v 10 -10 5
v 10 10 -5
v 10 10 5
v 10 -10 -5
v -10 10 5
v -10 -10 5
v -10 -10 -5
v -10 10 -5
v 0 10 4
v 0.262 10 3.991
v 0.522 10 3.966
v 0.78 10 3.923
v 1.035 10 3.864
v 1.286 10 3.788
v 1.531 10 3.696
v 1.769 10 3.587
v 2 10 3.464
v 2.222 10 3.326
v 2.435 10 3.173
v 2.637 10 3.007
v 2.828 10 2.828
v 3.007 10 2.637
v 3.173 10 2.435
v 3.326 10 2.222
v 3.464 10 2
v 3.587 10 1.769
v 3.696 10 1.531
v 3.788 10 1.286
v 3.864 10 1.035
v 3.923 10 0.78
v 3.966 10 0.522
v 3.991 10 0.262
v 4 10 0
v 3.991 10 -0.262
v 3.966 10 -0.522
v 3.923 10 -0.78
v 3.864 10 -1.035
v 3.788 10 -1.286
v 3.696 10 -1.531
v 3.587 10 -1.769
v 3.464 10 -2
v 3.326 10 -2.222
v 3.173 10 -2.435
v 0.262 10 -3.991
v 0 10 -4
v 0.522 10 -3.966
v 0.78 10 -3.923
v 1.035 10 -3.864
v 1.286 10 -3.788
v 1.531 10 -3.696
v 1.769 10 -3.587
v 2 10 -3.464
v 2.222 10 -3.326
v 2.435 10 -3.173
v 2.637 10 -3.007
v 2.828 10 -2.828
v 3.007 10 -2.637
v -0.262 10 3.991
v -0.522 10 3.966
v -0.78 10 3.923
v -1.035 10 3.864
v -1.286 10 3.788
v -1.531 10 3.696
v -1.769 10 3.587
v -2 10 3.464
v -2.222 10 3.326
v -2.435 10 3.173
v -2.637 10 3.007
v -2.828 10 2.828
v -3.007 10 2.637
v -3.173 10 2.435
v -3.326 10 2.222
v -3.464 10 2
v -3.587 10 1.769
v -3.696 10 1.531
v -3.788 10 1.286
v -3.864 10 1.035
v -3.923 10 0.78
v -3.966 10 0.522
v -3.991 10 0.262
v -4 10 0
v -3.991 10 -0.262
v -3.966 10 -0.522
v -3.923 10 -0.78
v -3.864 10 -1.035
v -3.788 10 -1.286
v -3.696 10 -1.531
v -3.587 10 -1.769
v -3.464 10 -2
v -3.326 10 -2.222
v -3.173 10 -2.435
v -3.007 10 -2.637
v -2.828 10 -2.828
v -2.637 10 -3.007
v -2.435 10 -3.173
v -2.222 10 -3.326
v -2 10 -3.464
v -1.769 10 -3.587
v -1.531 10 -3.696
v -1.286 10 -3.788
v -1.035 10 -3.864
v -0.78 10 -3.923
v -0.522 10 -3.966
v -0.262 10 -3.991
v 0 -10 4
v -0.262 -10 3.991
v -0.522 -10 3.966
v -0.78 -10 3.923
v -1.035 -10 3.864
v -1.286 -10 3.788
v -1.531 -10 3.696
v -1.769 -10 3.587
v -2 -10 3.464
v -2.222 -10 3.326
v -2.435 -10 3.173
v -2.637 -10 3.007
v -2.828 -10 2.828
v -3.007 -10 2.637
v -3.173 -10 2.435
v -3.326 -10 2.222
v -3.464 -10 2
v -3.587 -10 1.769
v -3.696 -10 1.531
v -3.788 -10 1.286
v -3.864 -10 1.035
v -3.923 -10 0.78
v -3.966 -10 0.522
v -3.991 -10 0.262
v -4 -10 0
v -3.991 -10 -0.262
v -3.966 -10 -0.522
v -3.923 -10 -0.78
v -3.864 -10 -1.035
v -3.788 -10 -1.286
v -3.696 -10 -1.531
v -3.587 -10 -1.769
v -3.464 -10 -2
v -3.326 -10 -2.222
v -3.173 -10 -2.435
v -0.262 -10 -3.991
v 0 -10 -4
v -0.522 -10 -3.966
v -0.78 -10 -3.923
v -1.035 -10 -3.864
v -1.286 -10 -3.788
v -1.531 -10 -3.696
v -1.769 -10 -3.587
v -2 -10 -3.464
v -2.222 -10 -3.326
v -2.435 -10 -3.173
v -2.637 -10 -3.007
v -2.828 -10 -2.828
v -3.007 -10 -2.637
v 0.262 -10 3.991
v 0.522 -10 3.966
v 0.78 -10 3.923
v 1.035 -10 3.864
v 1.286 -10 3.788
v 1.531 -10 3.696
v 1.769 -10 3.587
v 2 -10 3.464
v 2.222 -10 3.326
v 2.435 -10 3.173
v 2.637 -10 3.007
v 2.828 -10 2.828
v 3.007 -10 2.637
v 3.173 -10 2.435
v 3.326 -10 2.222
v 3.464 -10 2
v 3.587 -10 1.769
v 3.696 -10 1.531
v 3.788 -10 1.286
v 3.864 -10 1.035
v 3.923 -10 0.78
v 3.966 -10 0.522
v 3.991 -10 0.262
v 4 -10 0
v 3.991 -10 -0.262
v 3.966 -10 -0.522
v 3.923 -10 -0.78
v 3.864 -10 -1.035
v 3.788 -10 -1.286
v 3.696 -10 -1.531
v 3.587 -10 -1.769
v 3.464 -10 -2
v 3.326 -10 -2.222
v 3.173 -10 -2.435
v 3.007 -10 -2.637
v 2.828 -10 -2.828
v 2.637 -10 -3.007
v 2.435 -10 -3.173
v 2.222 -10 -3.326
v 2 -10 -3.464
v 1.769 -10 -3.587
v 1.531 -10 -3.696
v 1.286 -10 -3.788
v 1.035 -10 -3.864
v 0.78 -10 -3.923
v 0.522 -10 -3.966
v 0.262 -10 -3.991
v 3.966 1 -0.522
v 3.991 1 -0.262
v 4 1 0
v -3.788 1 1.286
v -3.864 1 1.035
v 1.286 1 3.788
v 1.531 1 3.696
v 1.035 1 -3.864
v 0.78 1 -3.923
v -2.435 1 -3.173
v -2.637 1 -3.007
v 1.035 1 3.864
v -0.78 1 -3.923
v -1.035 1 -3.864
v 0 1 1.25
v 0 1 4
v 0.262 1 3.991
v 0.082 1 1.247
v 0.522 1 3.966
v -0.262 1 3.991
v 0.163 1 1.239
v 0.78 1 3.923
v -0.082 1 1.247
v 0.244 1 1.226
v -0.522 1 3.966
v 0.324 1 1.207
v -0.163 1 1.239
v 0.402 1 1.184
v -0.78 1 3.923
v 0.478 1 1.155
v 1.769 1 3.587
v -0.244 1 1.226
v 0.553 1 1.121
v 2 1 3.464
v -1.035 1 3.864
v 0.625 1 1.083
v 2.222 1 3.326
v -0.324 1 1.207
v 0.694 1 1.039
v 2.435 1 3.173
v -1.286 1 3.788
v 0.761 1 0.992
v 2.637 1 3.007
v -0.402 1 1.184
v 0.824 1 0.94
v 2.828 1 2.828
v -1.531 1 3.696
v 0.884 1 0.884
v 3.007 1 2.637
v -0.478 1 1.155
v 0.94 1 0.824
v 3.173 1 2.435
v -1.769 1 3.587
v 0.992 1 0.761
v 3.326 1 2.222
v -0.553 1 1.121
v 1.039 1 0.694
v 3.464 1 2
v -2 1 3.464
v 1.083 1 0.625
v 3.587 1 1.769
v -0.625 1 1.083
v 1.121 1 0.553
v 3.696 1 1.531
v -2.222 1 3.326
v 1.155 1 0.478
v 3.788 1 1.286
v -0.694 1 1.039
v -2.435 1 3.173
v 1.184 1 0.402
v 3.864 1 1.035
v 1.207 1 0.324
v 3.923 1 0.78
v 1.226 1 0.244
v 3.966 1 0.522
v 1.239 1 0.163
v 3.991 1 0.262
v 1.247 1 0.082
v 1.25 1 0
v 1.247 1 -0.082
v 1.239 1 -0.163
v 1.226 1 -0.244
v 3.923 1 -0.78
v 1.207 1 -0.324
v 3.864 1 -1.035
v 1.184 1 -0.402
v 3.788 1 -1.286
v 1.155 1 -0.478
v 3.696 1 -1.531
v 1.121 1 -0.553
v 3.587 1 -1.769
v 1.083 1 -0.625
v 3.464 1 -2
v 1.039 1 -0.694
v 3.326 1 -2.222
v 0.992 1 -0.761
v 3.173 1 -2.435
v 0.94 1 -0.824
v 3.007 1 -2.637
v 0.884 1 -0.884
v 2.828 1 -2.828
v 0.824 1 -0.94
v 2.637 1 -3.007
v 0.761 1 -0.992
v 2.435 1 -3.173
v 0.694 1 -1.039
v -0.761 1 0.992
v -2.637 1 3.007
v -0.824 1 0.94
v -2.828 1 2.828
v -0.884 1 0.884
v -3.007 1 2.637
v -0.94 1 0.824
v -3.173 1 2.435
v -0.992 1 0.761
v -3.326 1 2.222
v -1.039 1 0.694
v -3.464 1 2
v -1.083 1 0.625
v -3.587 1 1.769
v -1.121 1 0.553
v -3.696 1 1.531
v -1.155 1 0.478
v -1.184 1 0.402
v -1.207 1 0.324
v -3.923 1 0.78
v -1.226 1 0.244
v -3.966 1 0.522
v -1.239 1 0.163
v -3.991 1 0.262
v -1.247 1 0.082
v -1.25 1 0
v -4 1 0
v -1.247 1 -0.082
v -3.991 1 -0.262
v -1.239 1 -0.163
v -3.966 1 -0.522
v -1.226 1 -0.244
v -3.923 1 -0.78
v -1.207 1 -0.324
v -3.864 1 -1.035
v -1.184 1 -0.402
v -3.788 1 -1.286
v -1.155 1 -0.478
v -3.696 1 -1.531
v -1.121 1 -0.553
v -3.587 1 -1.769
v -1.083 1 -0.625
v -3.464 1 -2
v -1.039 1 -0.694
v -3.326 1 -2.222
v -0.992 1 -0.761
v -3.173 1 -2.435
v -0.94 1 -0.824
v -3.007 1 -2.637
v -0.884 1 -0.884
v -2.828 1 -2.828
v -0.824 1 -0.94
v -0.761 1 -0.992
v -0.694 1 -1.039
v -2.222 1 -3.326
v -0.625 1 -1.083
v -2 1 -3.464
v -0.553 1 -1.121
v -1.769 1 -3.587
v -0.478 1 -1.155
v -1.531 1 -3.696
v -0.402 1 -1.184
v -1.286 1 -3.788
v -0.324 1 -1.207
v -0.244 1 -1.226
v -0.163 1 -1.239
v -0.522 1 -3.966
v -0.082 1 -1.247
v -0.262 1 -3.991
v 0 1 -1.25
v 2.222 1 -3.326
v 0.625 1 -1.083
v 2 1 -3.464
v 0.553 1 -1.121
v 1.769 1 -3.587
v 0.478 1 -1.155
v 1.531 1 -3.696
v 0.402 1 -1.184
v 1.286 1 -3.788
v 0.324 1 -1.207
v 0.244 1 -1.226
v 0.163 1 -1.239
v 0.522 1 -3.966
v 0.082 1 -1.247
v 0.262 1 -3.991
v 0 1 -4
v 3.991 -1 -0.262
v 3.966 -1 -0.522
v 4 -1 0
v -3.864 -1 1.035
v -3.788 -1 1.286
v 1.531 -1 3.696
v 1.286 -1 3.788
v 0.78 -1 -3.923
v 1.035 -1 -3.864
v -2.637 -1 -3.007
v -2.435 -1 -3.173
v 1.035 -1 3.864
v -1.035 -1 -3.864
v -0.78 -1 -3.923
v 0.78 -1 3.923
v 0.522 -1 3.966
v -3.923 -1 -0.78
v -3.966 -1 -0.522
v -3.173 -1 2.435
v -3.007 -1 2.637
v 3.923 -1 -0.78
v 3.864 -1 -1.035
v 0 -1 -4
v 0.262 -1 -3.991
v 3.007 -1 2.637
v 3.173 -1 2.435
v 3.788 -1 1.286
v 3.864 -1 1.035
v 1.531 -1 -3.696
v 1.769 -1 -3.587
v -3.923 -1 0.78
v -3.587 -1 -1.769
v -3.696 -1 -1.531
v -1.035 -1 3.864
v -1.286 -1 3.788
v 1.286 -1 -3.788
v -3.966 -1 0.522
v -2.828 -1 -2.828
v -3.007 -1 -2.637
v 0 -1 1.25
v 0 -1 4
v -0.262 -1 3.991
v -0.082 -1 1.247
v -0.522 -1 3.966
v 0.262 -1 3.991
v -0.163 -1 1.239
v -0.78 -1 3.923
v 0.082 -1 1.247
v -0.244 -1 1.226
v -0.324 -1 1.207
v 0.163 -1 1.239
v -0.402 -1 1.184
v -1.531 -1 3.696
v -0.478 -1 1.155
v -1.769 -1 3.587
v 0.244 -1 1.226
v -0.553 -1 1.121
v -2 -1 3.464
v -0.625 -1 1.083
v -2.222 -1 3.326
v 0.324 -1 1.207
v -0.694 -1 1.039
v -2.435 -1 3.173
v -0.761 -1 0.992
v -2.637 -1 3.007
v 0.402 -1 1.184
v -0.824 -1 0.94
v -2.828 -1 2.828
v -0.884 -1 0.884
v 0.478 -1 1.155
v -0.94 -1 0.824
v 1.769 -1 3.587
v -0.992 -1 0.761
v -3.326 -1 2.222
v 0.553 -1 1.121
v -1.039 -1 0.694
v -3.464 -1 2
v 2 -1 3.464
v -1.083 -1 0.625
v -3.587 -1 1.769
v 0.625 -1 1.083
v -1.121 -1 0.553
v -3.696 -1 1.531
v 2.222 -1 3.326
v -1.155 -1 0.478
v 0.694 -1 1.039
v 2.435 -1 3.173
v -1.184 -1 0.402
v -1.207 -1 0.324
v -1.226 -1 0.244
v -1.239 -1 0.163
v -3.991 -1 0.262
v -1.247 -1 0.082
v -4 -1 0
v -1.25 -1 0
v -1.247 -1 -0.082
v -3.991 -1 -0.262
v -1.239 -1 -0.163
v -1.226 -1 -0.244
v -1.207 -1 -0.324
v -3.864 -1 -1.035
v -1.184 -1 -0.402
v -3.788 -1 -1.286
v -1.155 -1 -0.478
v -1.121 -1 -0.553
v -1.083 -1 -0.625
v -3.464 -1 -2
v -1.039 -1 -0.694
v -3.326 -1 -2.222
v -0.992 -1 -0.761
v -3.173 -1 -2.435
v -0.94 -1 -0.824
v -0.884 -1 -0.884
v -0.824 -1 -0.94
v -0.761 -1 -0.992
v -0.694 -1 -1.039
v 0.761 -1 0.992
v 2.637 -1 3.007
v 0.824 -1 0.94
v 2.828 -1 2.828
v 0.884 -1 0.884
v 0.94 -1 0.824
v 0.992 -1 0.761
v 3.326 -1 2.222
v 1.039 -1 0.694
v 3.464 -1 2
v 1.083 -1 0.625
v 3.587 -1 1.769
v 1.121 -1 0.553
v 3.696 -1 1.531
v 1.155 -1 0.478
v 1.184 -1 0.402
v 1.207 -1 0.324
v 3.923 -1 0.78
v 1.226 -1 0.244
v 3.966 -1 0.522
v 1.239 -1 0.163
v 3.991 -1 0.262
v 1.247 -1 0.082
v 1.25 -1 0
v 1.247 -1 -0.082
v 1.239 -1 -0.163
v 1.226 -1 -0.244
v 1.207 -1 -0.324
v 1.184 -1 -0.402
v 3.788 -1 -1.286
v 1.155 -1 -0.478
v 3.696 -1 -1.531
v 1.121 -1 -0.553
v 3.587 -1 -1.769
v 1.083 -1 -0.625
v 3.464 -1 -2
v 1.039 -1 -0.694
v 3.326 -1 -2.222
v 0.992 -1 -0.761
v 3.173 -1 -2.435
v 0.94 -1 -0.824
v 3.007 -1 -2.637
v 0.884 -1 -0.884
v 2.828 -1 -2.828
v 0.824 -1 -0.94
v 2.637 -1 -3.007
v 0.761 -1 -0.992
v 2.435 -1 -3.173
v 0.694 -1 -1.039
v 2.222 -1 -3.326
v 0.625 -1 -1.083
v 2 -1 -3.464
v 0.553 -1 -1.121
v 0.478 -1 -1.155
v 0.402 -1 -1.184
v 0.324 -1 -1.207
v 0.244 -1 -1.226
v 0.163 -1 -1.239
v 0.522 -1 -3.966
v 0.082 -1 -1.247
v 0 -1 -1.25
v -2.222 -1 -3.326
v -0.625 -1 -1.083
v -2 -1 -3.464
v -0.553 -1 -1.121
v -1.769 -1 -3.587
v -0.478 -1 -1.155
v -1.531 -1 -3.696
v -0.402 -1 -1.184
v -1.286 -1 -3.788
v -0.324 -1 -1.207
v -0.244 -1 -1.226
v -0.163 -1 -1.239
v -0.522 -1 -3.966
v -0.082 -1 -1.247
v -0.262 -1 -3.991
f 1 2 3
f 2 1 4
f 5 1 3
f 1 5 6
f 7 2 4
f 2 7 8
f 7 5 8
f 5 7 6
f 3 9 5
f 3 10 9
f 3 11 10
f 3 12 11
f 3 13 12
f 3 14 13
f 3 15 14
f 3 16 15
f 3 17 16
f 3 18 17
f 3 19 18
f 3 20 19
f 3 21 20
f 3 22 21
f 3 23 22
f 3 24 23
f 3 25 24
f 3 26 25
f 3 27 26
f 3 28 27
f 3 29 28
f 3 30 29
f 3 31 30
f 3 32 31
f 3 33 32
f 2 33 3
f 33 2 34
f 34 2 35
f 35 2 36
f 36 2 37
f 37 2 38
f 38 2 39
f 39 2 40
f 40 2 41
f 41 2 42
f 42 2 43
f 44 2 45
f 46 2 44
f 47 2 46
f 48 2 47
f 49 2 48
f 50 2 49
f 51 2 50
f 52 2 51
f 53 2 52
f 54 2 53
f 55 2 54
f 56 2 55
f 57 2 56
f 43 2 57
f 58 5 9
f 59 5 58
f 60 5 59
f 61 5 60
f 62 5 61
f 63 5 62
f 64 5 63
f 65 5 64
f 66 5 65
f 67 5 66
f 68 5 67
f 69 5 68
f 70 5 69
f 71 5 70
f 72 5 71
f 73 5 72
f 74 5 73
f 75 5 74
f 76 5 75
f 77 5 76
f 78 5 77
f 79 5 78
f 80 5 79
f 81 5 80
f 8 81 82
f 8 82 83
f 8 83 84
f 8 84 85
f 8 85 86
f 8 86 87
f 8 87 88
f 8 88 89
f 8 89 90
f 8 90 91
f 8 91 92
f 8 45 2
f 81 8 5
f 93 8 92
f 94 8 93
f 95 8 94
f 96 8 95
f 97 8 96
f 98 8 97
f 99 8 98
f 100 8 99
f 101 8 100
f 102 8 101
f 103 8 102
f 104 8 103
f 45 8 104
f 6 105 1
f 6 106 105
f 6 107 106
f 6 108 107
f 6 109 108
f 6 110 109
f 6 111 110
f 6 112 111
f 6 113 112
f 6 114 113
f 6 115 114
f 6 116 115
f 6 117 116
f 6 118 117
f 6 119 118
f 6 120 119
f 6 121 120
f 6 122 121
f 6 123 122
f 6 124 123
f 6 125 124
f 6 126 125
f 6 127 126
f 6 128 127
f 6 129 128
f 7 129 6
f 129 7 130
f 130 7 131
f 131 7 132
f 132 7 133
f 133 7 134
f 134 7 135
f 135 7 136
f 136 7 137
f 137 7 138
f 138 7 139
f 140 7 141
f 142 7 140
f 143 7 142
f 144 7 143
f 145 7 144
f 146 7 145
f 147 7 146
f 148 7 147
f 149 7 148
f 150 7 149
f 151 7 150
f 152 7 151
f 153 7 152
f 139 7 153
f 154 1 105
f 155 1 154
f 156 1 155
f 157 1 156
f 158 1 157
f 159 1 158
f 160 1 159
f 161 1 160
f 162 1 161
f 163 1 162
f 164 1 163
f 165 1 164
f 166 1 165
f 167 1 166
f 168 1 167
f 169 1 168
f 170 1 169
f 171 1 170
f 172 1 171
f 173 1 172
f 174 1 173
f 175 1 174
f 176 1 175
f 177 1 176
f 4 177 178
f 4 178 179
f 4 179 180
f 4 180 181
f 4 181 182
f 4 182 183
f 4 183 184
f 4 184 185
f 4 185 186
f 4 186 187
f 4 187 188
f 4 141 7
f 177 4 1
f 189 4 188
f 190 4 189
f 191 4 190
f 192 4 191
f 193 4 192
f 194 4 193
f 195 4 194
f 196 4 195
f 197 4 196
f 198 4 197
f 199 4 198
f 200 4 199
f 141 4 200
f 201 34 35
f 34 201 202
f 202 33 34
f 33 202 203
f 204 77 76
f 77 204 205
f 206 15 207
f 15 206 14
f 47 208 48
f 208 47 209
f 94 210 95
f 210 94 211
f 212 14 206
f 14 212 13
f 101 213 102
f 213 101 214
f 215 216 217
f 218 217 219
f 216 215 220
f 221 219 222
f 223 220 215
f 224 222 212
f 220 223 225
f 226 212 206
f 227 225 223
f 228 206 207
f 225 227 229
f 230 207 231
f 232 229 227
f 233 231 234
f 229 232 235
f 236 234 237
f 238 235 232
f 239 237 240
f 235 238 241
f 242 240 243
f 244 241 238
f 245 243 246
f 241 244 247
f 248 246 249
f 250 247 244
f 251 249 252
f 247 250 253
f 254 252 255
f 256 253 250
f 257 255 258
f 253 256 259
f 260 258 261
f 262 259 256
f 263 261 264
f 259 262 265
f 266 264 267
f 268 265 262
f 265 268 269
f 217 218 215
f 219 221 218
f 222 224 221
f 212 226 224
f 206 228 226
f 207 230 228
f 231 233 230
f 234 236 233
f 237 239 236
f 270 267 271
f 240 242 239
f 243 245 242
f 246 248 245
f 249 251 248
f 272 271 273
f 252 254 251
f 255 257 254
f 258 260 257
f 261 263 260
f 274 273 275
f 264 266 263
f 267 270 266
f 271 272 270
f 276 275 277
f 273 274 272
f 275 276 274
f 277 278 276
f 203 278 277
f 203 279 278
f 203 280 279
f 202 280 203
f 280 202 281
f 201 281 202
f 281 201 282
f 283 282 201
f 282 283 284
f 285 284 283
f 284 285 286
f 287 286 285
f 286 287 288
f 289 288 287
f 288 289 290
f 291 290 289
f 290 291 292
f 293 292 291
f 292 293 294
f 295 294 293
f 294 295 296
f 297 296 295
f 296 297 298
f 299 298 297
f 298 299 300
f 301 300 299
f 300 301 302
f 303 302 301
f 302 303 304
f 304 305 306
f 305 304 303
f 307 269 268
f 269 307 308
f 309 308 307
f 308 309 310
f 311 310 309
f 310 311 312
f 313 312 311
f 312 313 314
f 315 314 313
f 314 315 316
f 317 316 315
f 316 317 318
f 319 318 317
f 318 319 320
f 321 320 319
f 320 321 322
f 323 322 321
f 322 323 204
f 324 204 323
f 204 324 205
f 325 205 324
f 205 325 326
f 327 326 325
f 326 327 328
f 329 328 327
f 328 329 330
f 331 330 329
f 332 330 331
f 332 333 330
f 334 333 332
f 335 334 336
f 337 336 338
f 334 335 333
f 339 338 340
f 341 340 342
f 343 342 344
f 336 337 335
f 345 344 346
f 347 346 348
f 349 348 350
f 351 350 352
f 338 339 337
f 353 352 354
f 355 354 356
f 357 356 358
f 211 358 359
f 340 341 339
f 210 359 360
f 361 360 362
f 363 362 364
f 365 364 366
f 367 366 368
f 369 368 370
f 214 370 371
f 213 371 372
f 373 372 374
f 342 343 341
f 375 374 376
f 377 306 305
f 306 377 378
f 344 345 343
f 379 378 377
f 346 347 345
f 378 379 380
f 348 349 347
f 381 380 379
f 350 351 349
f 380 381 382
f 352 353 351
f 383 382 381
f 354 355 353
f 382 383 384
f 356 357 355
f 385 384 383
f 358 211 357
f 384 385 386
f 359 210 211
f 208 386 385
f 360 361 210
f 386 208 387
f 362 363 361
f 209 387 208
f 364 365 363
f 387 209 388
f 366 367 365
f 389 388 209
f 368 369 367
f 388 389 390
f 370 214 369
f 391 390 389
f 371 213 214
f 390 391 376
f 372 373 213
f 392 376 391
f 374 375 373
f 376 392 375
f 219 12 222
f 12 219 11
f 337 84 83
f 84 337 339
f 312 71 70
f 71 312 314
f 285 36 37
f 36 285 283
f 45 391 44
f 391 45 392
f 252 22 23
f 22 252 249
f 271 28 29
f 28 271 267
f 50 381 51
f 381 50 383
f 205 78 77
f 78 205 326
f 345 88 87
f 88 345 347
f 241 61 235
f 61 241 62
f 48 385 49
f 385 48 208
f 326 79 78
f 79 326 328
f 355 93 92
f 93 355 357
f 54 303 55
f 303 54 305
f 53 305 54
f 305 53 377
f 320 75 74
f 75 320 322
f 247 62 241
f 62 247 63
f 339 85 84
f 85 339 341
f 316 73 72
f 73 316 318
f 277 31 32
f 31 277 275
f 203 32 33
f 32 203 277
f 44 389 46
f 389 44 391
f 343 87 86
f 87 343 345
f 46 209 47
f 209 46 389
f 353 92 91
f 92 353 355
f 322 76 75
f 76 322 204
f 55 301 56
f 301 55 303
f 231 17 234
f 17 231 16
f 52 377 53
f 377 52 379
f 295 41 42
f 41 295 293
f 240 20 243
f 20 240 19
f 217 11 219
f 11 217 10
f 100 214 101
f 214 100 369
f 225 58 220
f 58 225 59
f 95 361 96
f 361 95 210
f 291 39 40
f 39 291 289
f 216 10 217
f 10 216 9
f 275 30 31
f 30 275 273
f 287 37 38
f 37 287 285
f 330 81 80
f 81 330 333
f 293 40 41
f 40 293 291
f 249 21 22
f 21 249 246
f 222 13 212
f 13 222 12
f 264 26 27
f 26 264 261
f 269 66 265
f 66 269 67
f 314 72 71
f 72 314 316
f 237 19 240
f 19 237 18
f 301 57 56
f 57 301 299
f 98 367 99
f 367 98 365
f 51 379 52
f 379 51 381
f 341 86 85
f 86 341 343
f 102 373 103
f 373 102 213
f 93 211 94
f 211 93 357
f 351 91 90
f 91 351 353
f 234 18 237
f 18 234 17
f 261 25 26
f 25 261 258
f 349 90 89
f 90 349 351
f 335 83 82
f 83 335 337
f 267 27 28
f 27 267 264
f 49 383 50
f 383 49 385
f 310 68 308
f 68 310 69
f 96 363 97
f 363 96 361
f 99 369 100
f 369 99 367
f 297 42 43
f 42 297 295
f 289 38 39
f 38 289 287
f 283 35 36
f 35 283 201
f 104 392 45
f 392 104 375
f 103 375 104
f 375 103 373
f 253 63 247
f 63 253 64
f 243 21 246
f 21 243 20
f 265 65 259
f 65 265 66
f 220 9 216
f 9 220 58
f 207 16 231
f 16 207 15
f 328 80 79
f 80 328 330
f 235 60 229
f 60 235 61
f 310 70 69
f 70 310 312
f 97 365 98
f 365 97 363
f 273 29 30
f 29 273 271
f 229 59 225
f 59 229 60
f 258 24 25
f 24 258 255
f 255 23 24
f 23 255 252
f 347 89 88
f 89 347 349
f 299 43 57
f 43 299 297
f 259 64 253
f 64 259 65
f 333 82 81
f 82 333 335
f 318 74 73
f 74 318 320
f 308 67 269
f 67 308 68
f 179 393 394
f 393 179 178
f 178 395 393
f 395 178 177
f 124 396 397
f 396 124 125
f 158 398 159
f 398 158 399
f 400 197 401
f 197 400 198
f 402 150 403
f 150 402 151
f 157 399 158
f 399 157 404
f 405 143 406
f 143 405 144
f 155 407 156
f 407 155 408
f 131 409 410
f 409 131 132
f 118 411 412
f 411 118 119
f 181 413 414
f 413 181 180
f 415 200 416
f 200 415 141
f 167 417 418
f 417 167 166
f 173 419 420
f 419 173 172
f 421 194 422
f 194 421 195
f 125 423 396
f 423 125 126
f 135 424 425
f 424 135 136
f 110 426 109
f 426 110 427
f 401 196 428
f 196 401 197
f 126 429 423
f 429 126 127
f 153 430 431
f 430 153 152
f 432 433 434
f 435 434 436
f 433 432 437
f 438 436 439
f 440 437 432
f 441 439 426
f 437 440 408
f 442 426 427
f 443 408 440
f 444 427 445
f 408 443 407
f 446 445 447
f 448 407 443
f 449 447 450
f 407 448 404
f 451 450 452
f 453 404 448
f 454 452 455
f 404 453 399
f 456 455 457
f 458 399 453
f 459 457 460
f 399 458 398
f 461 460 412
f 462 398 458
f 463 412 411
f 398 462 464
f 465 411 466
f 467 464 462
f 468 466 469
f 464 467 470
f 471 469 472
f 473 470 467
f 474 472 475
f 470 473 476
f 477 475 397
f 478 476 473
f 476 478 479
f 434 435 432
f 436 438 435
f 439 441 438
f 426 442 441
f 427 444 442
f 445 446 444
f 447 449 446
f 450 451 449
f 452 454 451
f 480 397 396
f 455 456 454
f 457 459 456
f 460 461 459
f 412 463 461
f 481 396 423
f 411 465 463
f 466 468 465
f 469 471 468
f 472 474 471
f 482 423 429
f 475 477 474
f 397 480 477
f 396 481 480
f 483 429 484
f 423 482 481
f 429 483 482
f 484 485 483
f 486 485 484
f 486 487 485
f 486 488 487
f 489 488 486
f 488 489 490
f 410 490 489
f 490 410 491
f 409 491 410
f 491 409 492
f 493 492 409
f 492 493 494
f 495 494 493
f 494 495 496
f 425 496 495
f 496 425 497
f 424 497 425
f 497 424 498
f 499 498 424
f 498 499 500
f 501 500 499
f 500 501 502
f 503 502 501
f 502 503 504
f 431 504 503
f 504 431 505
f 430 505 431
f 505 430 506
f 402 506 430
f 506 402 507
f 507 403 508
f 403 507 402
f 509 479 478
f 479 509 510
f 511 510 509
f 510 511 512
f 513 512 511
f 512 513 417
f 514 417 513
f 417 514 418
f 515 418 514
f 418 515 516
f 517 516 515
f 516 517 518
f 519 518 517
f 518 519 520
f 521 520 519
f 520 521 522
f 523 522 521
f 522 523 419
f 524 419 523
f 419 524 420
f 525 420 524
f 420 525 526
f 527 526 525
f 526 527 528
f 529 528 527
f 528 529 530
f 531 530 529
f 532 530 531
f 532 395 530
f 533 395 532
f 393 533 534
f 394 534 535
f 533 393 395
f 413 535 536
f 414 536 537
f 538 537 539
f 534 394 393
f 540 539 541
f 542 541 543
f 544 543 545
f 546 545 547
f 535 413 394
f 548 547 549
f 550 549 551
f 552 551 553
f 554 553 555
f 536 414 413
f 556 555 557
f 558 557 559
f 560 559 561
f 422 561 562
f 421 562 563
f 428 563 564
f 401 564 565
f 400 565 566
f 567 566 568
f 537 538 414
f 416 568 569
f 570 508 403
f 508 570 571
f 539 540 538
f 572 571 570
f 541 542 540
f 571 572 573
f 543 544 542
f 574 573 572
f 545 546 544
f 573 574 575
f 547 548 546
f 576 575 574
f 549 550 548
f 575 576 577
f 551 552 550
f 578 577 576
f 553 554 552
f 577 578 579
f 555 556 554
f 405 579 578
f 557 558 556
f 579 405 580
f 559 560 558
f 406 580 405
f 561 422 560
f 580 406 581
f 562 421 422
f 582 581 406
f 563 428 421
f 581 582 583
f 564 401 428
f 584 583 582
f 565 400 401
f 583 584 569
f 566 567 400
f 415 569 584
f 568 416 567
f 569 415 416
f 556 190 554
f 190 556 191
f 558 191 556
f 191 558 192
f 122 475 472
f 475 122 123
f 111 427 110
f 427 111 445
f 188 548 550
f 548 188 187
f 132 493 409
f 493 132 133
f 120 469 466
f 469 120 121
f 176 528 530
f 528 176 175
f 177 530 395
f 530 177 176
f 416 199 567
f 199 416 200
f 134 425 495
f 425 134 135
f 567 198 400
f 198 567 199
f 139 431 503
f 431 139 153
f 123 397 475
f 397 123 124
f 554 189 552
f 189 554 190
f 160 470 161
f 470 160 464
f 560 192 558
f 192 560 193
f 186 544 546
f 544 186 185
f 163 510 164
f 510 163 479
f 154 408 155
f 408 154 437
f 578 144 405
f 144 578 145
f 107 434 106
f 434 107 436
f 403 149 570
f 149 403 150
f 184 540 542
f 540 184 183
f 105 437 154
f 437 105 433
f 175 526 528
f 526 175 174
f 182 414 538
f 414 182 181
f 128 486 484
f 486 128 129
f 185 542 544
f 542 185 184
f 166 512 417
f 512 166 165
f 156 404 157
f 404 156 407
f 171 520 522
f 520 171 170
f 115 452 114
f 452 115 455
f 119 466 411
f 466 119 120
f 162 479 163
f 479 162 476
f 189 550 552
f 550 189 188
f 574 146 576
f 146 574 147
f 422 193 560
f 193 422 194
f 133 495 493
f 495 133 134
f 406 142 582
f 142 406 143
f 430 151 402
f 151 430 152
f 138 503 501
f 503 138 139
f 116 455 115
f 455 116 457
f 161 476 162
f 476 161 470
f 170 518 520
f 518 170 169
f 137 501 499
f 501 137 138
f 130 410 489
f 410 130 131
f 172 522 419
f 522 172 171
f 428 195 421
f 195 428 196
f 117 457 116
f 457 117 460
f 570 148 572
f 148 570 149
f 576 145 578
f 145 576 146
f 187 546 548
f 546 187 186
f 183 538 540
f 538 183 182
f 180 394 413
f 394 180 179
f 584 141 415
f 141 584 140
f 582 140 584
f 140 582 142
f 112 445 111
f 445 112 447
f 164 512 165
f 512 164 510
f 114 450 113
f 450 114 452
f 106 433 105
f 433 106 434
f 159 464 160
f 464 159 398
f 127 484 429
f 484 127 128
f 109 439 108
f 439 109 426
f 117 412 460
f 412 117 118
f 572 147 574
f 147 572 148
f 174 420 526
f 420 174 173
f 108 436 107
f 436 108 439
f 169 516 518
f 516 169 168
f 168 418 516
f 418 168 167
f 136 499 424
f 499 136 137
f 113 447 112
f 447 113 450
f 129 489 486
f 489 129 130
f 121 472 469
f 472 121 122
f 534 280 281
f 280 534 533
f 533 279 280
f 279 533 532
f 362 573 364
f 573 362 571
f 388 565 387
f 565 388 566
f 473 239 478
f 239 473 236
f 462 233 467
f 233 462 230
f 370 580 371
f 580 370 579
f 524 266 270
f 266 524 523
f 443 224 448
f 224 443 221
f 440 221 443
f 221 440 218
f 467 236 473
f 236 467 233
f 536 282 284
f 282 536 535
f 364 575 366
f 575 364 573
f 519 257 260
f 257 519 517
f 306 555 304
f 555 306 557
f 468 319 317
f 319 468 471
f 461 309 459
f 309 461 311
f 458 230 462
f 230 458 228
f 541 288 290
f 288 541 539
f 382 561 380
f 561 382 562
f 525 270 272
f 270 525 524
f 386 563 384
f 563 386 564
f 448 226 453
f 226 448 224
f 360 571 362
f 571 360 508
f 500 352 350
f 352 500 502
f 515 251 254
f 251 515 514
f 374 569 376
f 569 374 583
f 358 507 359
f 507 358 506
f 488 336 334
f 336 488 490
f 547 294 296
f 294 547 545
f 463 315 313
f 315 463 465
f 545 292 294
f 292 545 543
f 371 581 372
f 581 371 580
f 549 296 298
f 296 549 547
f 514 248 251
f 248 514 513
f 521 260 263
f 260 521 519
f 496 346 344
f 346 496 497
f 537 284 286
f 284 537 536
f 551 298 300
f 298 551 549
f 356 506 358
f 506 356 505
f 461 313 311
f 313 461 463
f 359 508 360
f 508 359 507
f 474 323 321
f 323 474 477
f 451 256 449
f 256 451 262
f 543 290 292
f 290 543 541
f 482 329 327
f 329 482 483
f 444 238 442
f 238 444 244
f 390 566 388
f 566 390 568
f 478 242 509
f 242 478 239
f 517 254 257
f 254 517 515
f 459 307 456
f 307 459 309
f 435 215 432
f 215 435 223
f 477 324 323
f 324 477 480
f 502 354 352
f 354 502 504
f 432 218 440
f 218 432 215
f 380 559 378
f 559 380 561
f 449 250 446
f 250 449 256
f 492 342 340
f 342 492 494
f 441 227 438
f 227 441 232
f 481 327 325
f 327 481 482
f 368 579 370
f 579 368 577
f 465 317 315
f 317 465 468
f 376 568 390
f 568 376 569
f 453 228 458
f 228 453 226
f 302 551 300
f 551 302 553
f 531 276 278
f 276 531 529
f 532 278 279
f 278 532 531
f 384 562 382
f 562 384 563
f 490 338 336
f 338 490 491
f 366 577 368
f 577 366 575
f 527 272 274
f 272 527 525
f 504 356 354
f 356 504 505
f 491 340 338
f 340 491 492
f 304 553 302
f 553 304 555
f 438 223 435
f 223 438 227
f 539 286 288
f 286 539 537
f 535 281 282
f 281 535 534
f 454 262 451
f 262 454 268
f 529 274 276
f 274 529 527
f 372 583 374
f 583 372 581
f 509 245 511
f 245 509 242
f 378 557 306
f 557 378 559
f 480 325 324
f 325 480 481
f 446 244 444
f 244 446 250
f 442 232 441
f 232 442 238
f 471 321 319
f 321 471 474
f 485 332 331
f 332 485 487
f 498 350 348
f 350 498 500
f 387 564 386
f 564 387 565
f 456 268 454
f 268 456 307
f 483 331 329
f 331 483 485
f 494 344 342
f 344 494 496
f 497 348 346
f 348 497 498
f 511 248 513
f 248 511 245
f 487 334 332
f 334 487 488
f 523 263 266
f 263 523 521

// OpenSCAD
// 02 短颈 —— 沿程只有 2mm 收窄的直孔
//
// 真值：通道瓶颈半径 = 1.25mm（颈的半径）。
//       颈只占通道全长的 1/10（20mm 里的 2mm）——这是"采样密度"的考题：
//       沿轴等距切 N 刀，切到没切到颈，答案就在 1.25 与 4.0 之间跳。
//
// 用途：证明"多刀"（加密站位）才是灵敏度的来源。
$fn = 96;
difference() {
  cube([20, 20, 10], center = true);
  // Ø8 通孔，中间留出 2mm 给颈（cyl 默认不居中，一律显式 center=true）
  translate([0, 10.5, 0]) rotate([-90, 0, 0]) cylinder(r = 4, h = 19, center = true);
  translate([0, -10.5, 0]) rotate([-90, 0, 0]) cylinder(r = 4, h = 19, center = true);
  // 短颈 Ø2.5，长度正好 2mm
  rotate([-90, 0, 0]) cylinder(r = 1.25, h = 2, center = true);
}
